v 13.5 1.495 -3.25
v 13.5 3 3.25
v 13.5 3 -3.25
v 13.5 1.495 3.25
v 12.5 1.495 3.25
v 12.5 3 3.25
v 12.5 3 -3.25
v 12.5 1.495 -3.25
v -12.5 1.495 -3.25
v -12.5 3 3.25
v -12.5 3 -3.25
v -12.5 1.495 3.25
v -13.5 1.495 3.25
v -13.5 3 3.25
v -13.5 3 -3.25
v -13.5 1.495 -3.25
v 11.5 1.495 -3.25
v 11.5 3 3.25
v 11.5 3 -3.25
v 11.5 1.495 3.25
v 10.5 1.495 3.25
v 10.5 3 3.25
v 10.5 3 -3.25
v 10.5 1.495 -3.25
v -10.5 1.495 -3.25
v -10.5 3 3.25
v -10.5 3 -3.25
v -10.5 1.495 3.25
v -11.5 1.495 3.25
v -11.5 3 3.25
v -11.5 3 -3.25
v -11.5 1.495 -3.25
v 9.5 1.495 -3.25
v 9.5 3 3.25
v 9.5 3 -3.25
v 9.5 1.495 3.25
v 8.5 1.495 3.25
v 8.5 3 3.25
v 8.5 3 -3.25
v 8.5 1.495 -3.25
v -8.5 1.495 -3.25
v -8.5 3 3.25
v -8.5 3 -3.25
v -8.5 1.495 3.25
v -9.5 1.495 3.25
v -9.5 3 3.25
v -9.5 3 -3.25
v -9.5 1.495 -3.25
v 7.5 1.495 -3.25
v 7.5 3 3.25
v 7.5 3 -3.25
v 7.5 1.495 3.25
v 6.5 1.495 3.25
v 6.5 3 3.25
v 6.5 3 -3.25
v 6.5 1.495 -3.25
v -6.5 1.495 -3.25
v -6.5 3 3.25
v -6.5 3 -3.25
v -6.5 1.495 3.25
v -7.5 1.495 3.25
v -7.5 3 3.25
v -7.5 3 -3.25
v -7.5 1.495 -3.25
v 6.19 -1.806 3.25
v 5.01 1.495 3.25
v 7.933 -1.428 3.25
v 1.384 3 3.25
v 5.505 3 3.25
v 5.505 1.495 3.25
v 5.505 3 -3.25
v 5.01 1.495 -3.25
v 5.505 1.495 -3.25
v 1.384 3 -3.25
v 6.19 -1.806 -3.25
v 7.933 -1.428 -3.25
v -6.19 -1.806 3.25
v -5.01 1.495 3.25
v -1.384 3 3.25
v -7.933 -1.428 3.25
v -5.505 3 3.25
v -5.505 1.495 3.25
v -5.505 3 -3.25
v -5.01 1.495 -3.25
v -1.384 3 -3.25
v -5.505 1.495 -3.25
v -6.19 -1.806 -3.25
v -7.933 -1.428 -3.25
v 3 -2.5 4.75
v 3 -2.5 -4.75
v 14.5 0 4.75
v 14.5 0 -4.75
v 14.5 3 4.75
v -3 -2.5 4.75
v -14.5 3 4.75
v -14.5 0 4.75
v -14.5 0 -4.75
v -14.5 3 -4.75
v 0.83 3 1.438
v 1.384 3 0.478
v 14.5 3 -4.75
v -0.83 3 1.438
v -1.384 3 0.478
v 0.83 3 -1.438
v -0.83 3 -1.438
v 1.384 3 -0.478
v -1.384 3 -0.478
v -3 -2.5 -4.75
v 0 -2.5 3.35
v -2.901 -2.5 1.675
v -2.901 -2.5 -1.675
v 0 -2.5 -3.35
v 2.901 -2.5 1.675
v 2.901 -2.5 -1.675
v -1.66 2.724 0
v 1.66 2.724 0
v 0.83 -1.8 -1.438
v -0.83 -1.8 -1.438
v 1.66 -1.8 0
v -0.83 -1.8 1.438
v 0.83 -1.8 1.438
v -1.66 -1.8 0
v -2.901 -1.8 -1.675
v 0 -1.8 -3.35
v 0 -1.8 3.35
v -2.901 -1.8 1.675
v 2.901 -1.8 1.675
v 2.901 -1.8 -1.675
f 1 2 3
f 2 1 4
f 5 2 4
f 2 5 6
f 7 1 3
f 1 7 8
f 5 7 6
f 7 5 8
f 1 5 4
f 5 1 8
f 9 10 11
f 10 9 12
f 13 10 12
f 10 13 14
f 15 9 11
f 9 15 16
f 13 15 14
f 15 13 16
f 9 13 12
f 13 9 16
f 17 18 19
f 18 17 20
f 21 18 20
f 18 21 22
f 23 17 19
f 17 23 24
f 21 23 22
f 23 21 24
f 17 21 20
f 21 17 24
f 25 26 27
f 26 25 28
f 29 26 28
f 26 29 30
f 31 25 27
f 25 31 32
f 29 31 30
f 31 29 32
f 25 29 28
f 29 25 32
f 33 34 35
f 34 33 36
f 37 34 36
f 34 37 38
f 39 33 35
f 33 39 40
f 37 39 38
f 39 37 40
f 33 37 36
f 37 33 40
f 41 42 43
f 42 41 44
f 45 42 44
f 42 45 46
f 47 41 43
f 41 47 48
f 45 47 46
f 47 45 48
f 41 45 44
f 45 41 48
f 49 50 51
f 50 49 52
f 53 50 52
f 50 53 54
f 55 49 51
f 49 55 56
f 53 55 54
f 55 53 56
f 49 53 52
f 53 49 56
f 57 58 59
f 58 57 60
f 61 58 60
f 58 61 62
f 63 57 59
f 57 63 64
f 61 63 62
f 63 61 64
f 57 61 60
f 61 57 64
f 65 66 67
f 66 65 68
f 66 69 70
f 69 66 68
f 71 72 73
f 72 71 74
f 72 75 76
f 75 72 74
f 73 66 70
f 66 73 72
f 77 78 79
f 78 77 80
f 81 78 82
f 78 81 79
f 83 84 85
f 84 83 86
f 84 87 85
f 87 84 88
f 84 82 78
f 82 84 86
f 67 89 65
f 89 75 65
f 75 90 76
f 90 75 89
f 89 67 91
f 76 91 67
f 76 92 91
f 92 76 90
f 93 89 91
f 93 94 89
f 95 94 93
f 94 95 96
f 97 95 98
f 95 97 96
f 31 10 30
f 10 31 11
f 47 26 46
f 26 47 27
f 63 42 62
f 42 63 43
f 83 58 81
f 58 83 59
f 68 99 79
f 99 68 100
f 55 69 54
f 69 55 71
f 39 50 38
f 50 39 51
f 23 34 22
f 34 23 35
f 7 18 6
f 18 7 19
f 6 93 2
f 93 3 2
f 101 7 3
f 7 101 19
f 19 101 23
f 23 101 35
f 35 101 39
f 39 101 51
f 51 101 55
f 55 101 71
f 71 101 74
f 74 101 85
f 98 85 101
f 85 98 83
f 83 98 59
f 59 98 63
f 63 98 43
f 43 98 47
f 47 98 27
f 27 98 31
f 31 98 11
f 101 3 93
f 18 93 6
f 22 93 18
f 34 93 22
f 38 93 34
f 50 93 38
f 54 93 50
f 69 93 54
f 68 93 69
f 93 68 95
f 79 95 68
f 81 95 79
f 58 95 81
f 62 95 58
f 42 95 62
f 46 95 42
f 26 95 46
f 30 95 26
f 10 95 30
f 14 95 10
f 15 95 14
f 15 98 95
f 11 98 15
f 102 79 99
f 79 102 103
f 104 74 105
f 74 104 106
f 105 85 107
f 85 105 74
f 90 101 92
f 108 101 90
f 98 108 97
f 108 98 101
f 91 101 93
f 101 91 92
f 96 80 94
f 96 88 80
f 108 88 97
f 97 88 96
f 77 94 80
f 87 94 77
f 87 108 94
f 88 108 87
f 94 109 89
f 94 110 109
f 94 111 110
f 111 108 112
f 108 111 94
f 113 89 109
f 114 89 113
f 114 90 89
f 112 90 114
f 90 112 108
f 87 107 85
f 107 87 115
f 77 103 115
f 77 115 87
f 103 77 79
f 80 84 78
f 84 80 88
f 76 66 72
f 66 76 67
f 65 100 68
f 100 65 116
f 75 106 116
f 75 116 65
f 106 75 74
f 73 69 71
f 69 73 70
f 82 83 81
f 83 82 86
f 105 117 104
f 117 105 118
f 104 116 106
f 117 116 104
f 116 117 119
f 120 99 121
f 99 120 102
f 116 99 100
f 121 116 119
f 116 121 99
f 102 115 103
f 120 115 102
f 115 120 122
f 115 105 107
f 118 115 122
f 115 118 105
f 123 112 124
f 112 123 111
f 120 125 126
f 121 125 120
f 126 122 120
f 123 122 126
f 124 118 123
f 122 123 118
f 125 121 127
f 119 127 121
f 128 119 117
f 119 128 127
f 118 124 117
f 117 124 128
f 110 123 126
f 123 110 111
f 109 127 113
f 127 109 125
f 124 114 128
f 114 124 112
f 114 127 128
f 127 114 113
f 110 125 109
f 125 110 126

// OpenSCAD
// Tough Belt Clip
// Design by Marius Gheorghescu, December 2013


// how many teeth on each side
teeth = 5;

// width of the belt in mm incl clearance (use 6.25 for typical GT2 belt)
belt_width = 6.5;

// thickness of the belt in mm (use 1.5 for GT2 belt)
belt_thickness = 1.5;

// belt pitch in mm (use 2.0 for GT2 belt)
pitch = 2.0;

// this controls the strength of the bracket 
shell = 1.5;

/* [Hidden] */
cutout_width = 6 + belt_thickness + shell;
len = 2*teeth*pitch + cutout_width;
round_corner_epsilon = 1;
epsilon = 0.01;


module belt()
{
	// reinforcement
	//cube([len, 2, h], center=true);

	for(i=[pitch/4:pitch:len]) {
		translate([i-len/2, 1.25, 0])
			cube([pitch - round_corner_epsilon, belt_thickness + round_corner_epsilon, belt_width], center=true);

	}

}



module clip() {
difference()  {

	union() {
		// general shape of the clip
		linear_extrude(belt_width + 2*shell, center=true) {
			polygon(points=[
				[len/2,0],
				[3,-2.5], 
				[-3,-2.5], 
				[-len/2,0], 
				[-len/2, shell + belt_thickness], 
				[len/2, shell + belt_thickness]
			]);
		}


		
	}

	// left belt turn
	rotate([0,0,-45])
	translate([-3.2/2 - shell - belt_thickness/2,0,0])
		cube([belt_thickness, 20 + 2*shell, belt_width], center=true);

	// right belt turn
	rotate([0,0,45])
//+ belt_thicknes/2 + shell
	translate([3.2/2 + shell + belt_thickness/2,0,0])
		cube([belt_thickness, 20 + 2*shell, belt_width], center=true);

	// cutouts
	translate([len/2 - teeth*pitch, shell + belt_thickness/2, 0])
		cube([pitch + epsilon, belt_thickness + epsilon, belt_width], center=true);

	translate([-len/2 + teeth*pitch, shell + belt_thickness/2, 0])
		cube([pitch + epsilon, belt_thickness + epsilon, belt_width], center=true);


	// m3 hole
	rotate([90,0,0])
		cylinder(r=1.66, h=10 + 2*shell, center=true);

	// hex nut
	translate([0, -3.8, 0])
	rotate([90,90,0])
		cylinder(r=3.35, h=4, center=true, $fn=6);

	// belt teeth
	for(i=[1:1:teeth]) {

		// left side
		
		translate([len/2 + pitch/4 - i*pitch, shell + belt_thickness/2, 0])
			cube([pitch/2, belt_thickness + epsilon, belt_width], center=true);

		// right side 
		
		translate([-len/2 - pitch/4 + i*pitch, shell + belt_thickness/2, 0])
			cube([pitch/2, belt_thickness + epsilon, belt_width], center=true);
	}

}


}


module clip_set()
{
	for(i=[0:10:50]) {
		translate([0,i,0])
			clip();
	}
}

//clip_set();
clip();
